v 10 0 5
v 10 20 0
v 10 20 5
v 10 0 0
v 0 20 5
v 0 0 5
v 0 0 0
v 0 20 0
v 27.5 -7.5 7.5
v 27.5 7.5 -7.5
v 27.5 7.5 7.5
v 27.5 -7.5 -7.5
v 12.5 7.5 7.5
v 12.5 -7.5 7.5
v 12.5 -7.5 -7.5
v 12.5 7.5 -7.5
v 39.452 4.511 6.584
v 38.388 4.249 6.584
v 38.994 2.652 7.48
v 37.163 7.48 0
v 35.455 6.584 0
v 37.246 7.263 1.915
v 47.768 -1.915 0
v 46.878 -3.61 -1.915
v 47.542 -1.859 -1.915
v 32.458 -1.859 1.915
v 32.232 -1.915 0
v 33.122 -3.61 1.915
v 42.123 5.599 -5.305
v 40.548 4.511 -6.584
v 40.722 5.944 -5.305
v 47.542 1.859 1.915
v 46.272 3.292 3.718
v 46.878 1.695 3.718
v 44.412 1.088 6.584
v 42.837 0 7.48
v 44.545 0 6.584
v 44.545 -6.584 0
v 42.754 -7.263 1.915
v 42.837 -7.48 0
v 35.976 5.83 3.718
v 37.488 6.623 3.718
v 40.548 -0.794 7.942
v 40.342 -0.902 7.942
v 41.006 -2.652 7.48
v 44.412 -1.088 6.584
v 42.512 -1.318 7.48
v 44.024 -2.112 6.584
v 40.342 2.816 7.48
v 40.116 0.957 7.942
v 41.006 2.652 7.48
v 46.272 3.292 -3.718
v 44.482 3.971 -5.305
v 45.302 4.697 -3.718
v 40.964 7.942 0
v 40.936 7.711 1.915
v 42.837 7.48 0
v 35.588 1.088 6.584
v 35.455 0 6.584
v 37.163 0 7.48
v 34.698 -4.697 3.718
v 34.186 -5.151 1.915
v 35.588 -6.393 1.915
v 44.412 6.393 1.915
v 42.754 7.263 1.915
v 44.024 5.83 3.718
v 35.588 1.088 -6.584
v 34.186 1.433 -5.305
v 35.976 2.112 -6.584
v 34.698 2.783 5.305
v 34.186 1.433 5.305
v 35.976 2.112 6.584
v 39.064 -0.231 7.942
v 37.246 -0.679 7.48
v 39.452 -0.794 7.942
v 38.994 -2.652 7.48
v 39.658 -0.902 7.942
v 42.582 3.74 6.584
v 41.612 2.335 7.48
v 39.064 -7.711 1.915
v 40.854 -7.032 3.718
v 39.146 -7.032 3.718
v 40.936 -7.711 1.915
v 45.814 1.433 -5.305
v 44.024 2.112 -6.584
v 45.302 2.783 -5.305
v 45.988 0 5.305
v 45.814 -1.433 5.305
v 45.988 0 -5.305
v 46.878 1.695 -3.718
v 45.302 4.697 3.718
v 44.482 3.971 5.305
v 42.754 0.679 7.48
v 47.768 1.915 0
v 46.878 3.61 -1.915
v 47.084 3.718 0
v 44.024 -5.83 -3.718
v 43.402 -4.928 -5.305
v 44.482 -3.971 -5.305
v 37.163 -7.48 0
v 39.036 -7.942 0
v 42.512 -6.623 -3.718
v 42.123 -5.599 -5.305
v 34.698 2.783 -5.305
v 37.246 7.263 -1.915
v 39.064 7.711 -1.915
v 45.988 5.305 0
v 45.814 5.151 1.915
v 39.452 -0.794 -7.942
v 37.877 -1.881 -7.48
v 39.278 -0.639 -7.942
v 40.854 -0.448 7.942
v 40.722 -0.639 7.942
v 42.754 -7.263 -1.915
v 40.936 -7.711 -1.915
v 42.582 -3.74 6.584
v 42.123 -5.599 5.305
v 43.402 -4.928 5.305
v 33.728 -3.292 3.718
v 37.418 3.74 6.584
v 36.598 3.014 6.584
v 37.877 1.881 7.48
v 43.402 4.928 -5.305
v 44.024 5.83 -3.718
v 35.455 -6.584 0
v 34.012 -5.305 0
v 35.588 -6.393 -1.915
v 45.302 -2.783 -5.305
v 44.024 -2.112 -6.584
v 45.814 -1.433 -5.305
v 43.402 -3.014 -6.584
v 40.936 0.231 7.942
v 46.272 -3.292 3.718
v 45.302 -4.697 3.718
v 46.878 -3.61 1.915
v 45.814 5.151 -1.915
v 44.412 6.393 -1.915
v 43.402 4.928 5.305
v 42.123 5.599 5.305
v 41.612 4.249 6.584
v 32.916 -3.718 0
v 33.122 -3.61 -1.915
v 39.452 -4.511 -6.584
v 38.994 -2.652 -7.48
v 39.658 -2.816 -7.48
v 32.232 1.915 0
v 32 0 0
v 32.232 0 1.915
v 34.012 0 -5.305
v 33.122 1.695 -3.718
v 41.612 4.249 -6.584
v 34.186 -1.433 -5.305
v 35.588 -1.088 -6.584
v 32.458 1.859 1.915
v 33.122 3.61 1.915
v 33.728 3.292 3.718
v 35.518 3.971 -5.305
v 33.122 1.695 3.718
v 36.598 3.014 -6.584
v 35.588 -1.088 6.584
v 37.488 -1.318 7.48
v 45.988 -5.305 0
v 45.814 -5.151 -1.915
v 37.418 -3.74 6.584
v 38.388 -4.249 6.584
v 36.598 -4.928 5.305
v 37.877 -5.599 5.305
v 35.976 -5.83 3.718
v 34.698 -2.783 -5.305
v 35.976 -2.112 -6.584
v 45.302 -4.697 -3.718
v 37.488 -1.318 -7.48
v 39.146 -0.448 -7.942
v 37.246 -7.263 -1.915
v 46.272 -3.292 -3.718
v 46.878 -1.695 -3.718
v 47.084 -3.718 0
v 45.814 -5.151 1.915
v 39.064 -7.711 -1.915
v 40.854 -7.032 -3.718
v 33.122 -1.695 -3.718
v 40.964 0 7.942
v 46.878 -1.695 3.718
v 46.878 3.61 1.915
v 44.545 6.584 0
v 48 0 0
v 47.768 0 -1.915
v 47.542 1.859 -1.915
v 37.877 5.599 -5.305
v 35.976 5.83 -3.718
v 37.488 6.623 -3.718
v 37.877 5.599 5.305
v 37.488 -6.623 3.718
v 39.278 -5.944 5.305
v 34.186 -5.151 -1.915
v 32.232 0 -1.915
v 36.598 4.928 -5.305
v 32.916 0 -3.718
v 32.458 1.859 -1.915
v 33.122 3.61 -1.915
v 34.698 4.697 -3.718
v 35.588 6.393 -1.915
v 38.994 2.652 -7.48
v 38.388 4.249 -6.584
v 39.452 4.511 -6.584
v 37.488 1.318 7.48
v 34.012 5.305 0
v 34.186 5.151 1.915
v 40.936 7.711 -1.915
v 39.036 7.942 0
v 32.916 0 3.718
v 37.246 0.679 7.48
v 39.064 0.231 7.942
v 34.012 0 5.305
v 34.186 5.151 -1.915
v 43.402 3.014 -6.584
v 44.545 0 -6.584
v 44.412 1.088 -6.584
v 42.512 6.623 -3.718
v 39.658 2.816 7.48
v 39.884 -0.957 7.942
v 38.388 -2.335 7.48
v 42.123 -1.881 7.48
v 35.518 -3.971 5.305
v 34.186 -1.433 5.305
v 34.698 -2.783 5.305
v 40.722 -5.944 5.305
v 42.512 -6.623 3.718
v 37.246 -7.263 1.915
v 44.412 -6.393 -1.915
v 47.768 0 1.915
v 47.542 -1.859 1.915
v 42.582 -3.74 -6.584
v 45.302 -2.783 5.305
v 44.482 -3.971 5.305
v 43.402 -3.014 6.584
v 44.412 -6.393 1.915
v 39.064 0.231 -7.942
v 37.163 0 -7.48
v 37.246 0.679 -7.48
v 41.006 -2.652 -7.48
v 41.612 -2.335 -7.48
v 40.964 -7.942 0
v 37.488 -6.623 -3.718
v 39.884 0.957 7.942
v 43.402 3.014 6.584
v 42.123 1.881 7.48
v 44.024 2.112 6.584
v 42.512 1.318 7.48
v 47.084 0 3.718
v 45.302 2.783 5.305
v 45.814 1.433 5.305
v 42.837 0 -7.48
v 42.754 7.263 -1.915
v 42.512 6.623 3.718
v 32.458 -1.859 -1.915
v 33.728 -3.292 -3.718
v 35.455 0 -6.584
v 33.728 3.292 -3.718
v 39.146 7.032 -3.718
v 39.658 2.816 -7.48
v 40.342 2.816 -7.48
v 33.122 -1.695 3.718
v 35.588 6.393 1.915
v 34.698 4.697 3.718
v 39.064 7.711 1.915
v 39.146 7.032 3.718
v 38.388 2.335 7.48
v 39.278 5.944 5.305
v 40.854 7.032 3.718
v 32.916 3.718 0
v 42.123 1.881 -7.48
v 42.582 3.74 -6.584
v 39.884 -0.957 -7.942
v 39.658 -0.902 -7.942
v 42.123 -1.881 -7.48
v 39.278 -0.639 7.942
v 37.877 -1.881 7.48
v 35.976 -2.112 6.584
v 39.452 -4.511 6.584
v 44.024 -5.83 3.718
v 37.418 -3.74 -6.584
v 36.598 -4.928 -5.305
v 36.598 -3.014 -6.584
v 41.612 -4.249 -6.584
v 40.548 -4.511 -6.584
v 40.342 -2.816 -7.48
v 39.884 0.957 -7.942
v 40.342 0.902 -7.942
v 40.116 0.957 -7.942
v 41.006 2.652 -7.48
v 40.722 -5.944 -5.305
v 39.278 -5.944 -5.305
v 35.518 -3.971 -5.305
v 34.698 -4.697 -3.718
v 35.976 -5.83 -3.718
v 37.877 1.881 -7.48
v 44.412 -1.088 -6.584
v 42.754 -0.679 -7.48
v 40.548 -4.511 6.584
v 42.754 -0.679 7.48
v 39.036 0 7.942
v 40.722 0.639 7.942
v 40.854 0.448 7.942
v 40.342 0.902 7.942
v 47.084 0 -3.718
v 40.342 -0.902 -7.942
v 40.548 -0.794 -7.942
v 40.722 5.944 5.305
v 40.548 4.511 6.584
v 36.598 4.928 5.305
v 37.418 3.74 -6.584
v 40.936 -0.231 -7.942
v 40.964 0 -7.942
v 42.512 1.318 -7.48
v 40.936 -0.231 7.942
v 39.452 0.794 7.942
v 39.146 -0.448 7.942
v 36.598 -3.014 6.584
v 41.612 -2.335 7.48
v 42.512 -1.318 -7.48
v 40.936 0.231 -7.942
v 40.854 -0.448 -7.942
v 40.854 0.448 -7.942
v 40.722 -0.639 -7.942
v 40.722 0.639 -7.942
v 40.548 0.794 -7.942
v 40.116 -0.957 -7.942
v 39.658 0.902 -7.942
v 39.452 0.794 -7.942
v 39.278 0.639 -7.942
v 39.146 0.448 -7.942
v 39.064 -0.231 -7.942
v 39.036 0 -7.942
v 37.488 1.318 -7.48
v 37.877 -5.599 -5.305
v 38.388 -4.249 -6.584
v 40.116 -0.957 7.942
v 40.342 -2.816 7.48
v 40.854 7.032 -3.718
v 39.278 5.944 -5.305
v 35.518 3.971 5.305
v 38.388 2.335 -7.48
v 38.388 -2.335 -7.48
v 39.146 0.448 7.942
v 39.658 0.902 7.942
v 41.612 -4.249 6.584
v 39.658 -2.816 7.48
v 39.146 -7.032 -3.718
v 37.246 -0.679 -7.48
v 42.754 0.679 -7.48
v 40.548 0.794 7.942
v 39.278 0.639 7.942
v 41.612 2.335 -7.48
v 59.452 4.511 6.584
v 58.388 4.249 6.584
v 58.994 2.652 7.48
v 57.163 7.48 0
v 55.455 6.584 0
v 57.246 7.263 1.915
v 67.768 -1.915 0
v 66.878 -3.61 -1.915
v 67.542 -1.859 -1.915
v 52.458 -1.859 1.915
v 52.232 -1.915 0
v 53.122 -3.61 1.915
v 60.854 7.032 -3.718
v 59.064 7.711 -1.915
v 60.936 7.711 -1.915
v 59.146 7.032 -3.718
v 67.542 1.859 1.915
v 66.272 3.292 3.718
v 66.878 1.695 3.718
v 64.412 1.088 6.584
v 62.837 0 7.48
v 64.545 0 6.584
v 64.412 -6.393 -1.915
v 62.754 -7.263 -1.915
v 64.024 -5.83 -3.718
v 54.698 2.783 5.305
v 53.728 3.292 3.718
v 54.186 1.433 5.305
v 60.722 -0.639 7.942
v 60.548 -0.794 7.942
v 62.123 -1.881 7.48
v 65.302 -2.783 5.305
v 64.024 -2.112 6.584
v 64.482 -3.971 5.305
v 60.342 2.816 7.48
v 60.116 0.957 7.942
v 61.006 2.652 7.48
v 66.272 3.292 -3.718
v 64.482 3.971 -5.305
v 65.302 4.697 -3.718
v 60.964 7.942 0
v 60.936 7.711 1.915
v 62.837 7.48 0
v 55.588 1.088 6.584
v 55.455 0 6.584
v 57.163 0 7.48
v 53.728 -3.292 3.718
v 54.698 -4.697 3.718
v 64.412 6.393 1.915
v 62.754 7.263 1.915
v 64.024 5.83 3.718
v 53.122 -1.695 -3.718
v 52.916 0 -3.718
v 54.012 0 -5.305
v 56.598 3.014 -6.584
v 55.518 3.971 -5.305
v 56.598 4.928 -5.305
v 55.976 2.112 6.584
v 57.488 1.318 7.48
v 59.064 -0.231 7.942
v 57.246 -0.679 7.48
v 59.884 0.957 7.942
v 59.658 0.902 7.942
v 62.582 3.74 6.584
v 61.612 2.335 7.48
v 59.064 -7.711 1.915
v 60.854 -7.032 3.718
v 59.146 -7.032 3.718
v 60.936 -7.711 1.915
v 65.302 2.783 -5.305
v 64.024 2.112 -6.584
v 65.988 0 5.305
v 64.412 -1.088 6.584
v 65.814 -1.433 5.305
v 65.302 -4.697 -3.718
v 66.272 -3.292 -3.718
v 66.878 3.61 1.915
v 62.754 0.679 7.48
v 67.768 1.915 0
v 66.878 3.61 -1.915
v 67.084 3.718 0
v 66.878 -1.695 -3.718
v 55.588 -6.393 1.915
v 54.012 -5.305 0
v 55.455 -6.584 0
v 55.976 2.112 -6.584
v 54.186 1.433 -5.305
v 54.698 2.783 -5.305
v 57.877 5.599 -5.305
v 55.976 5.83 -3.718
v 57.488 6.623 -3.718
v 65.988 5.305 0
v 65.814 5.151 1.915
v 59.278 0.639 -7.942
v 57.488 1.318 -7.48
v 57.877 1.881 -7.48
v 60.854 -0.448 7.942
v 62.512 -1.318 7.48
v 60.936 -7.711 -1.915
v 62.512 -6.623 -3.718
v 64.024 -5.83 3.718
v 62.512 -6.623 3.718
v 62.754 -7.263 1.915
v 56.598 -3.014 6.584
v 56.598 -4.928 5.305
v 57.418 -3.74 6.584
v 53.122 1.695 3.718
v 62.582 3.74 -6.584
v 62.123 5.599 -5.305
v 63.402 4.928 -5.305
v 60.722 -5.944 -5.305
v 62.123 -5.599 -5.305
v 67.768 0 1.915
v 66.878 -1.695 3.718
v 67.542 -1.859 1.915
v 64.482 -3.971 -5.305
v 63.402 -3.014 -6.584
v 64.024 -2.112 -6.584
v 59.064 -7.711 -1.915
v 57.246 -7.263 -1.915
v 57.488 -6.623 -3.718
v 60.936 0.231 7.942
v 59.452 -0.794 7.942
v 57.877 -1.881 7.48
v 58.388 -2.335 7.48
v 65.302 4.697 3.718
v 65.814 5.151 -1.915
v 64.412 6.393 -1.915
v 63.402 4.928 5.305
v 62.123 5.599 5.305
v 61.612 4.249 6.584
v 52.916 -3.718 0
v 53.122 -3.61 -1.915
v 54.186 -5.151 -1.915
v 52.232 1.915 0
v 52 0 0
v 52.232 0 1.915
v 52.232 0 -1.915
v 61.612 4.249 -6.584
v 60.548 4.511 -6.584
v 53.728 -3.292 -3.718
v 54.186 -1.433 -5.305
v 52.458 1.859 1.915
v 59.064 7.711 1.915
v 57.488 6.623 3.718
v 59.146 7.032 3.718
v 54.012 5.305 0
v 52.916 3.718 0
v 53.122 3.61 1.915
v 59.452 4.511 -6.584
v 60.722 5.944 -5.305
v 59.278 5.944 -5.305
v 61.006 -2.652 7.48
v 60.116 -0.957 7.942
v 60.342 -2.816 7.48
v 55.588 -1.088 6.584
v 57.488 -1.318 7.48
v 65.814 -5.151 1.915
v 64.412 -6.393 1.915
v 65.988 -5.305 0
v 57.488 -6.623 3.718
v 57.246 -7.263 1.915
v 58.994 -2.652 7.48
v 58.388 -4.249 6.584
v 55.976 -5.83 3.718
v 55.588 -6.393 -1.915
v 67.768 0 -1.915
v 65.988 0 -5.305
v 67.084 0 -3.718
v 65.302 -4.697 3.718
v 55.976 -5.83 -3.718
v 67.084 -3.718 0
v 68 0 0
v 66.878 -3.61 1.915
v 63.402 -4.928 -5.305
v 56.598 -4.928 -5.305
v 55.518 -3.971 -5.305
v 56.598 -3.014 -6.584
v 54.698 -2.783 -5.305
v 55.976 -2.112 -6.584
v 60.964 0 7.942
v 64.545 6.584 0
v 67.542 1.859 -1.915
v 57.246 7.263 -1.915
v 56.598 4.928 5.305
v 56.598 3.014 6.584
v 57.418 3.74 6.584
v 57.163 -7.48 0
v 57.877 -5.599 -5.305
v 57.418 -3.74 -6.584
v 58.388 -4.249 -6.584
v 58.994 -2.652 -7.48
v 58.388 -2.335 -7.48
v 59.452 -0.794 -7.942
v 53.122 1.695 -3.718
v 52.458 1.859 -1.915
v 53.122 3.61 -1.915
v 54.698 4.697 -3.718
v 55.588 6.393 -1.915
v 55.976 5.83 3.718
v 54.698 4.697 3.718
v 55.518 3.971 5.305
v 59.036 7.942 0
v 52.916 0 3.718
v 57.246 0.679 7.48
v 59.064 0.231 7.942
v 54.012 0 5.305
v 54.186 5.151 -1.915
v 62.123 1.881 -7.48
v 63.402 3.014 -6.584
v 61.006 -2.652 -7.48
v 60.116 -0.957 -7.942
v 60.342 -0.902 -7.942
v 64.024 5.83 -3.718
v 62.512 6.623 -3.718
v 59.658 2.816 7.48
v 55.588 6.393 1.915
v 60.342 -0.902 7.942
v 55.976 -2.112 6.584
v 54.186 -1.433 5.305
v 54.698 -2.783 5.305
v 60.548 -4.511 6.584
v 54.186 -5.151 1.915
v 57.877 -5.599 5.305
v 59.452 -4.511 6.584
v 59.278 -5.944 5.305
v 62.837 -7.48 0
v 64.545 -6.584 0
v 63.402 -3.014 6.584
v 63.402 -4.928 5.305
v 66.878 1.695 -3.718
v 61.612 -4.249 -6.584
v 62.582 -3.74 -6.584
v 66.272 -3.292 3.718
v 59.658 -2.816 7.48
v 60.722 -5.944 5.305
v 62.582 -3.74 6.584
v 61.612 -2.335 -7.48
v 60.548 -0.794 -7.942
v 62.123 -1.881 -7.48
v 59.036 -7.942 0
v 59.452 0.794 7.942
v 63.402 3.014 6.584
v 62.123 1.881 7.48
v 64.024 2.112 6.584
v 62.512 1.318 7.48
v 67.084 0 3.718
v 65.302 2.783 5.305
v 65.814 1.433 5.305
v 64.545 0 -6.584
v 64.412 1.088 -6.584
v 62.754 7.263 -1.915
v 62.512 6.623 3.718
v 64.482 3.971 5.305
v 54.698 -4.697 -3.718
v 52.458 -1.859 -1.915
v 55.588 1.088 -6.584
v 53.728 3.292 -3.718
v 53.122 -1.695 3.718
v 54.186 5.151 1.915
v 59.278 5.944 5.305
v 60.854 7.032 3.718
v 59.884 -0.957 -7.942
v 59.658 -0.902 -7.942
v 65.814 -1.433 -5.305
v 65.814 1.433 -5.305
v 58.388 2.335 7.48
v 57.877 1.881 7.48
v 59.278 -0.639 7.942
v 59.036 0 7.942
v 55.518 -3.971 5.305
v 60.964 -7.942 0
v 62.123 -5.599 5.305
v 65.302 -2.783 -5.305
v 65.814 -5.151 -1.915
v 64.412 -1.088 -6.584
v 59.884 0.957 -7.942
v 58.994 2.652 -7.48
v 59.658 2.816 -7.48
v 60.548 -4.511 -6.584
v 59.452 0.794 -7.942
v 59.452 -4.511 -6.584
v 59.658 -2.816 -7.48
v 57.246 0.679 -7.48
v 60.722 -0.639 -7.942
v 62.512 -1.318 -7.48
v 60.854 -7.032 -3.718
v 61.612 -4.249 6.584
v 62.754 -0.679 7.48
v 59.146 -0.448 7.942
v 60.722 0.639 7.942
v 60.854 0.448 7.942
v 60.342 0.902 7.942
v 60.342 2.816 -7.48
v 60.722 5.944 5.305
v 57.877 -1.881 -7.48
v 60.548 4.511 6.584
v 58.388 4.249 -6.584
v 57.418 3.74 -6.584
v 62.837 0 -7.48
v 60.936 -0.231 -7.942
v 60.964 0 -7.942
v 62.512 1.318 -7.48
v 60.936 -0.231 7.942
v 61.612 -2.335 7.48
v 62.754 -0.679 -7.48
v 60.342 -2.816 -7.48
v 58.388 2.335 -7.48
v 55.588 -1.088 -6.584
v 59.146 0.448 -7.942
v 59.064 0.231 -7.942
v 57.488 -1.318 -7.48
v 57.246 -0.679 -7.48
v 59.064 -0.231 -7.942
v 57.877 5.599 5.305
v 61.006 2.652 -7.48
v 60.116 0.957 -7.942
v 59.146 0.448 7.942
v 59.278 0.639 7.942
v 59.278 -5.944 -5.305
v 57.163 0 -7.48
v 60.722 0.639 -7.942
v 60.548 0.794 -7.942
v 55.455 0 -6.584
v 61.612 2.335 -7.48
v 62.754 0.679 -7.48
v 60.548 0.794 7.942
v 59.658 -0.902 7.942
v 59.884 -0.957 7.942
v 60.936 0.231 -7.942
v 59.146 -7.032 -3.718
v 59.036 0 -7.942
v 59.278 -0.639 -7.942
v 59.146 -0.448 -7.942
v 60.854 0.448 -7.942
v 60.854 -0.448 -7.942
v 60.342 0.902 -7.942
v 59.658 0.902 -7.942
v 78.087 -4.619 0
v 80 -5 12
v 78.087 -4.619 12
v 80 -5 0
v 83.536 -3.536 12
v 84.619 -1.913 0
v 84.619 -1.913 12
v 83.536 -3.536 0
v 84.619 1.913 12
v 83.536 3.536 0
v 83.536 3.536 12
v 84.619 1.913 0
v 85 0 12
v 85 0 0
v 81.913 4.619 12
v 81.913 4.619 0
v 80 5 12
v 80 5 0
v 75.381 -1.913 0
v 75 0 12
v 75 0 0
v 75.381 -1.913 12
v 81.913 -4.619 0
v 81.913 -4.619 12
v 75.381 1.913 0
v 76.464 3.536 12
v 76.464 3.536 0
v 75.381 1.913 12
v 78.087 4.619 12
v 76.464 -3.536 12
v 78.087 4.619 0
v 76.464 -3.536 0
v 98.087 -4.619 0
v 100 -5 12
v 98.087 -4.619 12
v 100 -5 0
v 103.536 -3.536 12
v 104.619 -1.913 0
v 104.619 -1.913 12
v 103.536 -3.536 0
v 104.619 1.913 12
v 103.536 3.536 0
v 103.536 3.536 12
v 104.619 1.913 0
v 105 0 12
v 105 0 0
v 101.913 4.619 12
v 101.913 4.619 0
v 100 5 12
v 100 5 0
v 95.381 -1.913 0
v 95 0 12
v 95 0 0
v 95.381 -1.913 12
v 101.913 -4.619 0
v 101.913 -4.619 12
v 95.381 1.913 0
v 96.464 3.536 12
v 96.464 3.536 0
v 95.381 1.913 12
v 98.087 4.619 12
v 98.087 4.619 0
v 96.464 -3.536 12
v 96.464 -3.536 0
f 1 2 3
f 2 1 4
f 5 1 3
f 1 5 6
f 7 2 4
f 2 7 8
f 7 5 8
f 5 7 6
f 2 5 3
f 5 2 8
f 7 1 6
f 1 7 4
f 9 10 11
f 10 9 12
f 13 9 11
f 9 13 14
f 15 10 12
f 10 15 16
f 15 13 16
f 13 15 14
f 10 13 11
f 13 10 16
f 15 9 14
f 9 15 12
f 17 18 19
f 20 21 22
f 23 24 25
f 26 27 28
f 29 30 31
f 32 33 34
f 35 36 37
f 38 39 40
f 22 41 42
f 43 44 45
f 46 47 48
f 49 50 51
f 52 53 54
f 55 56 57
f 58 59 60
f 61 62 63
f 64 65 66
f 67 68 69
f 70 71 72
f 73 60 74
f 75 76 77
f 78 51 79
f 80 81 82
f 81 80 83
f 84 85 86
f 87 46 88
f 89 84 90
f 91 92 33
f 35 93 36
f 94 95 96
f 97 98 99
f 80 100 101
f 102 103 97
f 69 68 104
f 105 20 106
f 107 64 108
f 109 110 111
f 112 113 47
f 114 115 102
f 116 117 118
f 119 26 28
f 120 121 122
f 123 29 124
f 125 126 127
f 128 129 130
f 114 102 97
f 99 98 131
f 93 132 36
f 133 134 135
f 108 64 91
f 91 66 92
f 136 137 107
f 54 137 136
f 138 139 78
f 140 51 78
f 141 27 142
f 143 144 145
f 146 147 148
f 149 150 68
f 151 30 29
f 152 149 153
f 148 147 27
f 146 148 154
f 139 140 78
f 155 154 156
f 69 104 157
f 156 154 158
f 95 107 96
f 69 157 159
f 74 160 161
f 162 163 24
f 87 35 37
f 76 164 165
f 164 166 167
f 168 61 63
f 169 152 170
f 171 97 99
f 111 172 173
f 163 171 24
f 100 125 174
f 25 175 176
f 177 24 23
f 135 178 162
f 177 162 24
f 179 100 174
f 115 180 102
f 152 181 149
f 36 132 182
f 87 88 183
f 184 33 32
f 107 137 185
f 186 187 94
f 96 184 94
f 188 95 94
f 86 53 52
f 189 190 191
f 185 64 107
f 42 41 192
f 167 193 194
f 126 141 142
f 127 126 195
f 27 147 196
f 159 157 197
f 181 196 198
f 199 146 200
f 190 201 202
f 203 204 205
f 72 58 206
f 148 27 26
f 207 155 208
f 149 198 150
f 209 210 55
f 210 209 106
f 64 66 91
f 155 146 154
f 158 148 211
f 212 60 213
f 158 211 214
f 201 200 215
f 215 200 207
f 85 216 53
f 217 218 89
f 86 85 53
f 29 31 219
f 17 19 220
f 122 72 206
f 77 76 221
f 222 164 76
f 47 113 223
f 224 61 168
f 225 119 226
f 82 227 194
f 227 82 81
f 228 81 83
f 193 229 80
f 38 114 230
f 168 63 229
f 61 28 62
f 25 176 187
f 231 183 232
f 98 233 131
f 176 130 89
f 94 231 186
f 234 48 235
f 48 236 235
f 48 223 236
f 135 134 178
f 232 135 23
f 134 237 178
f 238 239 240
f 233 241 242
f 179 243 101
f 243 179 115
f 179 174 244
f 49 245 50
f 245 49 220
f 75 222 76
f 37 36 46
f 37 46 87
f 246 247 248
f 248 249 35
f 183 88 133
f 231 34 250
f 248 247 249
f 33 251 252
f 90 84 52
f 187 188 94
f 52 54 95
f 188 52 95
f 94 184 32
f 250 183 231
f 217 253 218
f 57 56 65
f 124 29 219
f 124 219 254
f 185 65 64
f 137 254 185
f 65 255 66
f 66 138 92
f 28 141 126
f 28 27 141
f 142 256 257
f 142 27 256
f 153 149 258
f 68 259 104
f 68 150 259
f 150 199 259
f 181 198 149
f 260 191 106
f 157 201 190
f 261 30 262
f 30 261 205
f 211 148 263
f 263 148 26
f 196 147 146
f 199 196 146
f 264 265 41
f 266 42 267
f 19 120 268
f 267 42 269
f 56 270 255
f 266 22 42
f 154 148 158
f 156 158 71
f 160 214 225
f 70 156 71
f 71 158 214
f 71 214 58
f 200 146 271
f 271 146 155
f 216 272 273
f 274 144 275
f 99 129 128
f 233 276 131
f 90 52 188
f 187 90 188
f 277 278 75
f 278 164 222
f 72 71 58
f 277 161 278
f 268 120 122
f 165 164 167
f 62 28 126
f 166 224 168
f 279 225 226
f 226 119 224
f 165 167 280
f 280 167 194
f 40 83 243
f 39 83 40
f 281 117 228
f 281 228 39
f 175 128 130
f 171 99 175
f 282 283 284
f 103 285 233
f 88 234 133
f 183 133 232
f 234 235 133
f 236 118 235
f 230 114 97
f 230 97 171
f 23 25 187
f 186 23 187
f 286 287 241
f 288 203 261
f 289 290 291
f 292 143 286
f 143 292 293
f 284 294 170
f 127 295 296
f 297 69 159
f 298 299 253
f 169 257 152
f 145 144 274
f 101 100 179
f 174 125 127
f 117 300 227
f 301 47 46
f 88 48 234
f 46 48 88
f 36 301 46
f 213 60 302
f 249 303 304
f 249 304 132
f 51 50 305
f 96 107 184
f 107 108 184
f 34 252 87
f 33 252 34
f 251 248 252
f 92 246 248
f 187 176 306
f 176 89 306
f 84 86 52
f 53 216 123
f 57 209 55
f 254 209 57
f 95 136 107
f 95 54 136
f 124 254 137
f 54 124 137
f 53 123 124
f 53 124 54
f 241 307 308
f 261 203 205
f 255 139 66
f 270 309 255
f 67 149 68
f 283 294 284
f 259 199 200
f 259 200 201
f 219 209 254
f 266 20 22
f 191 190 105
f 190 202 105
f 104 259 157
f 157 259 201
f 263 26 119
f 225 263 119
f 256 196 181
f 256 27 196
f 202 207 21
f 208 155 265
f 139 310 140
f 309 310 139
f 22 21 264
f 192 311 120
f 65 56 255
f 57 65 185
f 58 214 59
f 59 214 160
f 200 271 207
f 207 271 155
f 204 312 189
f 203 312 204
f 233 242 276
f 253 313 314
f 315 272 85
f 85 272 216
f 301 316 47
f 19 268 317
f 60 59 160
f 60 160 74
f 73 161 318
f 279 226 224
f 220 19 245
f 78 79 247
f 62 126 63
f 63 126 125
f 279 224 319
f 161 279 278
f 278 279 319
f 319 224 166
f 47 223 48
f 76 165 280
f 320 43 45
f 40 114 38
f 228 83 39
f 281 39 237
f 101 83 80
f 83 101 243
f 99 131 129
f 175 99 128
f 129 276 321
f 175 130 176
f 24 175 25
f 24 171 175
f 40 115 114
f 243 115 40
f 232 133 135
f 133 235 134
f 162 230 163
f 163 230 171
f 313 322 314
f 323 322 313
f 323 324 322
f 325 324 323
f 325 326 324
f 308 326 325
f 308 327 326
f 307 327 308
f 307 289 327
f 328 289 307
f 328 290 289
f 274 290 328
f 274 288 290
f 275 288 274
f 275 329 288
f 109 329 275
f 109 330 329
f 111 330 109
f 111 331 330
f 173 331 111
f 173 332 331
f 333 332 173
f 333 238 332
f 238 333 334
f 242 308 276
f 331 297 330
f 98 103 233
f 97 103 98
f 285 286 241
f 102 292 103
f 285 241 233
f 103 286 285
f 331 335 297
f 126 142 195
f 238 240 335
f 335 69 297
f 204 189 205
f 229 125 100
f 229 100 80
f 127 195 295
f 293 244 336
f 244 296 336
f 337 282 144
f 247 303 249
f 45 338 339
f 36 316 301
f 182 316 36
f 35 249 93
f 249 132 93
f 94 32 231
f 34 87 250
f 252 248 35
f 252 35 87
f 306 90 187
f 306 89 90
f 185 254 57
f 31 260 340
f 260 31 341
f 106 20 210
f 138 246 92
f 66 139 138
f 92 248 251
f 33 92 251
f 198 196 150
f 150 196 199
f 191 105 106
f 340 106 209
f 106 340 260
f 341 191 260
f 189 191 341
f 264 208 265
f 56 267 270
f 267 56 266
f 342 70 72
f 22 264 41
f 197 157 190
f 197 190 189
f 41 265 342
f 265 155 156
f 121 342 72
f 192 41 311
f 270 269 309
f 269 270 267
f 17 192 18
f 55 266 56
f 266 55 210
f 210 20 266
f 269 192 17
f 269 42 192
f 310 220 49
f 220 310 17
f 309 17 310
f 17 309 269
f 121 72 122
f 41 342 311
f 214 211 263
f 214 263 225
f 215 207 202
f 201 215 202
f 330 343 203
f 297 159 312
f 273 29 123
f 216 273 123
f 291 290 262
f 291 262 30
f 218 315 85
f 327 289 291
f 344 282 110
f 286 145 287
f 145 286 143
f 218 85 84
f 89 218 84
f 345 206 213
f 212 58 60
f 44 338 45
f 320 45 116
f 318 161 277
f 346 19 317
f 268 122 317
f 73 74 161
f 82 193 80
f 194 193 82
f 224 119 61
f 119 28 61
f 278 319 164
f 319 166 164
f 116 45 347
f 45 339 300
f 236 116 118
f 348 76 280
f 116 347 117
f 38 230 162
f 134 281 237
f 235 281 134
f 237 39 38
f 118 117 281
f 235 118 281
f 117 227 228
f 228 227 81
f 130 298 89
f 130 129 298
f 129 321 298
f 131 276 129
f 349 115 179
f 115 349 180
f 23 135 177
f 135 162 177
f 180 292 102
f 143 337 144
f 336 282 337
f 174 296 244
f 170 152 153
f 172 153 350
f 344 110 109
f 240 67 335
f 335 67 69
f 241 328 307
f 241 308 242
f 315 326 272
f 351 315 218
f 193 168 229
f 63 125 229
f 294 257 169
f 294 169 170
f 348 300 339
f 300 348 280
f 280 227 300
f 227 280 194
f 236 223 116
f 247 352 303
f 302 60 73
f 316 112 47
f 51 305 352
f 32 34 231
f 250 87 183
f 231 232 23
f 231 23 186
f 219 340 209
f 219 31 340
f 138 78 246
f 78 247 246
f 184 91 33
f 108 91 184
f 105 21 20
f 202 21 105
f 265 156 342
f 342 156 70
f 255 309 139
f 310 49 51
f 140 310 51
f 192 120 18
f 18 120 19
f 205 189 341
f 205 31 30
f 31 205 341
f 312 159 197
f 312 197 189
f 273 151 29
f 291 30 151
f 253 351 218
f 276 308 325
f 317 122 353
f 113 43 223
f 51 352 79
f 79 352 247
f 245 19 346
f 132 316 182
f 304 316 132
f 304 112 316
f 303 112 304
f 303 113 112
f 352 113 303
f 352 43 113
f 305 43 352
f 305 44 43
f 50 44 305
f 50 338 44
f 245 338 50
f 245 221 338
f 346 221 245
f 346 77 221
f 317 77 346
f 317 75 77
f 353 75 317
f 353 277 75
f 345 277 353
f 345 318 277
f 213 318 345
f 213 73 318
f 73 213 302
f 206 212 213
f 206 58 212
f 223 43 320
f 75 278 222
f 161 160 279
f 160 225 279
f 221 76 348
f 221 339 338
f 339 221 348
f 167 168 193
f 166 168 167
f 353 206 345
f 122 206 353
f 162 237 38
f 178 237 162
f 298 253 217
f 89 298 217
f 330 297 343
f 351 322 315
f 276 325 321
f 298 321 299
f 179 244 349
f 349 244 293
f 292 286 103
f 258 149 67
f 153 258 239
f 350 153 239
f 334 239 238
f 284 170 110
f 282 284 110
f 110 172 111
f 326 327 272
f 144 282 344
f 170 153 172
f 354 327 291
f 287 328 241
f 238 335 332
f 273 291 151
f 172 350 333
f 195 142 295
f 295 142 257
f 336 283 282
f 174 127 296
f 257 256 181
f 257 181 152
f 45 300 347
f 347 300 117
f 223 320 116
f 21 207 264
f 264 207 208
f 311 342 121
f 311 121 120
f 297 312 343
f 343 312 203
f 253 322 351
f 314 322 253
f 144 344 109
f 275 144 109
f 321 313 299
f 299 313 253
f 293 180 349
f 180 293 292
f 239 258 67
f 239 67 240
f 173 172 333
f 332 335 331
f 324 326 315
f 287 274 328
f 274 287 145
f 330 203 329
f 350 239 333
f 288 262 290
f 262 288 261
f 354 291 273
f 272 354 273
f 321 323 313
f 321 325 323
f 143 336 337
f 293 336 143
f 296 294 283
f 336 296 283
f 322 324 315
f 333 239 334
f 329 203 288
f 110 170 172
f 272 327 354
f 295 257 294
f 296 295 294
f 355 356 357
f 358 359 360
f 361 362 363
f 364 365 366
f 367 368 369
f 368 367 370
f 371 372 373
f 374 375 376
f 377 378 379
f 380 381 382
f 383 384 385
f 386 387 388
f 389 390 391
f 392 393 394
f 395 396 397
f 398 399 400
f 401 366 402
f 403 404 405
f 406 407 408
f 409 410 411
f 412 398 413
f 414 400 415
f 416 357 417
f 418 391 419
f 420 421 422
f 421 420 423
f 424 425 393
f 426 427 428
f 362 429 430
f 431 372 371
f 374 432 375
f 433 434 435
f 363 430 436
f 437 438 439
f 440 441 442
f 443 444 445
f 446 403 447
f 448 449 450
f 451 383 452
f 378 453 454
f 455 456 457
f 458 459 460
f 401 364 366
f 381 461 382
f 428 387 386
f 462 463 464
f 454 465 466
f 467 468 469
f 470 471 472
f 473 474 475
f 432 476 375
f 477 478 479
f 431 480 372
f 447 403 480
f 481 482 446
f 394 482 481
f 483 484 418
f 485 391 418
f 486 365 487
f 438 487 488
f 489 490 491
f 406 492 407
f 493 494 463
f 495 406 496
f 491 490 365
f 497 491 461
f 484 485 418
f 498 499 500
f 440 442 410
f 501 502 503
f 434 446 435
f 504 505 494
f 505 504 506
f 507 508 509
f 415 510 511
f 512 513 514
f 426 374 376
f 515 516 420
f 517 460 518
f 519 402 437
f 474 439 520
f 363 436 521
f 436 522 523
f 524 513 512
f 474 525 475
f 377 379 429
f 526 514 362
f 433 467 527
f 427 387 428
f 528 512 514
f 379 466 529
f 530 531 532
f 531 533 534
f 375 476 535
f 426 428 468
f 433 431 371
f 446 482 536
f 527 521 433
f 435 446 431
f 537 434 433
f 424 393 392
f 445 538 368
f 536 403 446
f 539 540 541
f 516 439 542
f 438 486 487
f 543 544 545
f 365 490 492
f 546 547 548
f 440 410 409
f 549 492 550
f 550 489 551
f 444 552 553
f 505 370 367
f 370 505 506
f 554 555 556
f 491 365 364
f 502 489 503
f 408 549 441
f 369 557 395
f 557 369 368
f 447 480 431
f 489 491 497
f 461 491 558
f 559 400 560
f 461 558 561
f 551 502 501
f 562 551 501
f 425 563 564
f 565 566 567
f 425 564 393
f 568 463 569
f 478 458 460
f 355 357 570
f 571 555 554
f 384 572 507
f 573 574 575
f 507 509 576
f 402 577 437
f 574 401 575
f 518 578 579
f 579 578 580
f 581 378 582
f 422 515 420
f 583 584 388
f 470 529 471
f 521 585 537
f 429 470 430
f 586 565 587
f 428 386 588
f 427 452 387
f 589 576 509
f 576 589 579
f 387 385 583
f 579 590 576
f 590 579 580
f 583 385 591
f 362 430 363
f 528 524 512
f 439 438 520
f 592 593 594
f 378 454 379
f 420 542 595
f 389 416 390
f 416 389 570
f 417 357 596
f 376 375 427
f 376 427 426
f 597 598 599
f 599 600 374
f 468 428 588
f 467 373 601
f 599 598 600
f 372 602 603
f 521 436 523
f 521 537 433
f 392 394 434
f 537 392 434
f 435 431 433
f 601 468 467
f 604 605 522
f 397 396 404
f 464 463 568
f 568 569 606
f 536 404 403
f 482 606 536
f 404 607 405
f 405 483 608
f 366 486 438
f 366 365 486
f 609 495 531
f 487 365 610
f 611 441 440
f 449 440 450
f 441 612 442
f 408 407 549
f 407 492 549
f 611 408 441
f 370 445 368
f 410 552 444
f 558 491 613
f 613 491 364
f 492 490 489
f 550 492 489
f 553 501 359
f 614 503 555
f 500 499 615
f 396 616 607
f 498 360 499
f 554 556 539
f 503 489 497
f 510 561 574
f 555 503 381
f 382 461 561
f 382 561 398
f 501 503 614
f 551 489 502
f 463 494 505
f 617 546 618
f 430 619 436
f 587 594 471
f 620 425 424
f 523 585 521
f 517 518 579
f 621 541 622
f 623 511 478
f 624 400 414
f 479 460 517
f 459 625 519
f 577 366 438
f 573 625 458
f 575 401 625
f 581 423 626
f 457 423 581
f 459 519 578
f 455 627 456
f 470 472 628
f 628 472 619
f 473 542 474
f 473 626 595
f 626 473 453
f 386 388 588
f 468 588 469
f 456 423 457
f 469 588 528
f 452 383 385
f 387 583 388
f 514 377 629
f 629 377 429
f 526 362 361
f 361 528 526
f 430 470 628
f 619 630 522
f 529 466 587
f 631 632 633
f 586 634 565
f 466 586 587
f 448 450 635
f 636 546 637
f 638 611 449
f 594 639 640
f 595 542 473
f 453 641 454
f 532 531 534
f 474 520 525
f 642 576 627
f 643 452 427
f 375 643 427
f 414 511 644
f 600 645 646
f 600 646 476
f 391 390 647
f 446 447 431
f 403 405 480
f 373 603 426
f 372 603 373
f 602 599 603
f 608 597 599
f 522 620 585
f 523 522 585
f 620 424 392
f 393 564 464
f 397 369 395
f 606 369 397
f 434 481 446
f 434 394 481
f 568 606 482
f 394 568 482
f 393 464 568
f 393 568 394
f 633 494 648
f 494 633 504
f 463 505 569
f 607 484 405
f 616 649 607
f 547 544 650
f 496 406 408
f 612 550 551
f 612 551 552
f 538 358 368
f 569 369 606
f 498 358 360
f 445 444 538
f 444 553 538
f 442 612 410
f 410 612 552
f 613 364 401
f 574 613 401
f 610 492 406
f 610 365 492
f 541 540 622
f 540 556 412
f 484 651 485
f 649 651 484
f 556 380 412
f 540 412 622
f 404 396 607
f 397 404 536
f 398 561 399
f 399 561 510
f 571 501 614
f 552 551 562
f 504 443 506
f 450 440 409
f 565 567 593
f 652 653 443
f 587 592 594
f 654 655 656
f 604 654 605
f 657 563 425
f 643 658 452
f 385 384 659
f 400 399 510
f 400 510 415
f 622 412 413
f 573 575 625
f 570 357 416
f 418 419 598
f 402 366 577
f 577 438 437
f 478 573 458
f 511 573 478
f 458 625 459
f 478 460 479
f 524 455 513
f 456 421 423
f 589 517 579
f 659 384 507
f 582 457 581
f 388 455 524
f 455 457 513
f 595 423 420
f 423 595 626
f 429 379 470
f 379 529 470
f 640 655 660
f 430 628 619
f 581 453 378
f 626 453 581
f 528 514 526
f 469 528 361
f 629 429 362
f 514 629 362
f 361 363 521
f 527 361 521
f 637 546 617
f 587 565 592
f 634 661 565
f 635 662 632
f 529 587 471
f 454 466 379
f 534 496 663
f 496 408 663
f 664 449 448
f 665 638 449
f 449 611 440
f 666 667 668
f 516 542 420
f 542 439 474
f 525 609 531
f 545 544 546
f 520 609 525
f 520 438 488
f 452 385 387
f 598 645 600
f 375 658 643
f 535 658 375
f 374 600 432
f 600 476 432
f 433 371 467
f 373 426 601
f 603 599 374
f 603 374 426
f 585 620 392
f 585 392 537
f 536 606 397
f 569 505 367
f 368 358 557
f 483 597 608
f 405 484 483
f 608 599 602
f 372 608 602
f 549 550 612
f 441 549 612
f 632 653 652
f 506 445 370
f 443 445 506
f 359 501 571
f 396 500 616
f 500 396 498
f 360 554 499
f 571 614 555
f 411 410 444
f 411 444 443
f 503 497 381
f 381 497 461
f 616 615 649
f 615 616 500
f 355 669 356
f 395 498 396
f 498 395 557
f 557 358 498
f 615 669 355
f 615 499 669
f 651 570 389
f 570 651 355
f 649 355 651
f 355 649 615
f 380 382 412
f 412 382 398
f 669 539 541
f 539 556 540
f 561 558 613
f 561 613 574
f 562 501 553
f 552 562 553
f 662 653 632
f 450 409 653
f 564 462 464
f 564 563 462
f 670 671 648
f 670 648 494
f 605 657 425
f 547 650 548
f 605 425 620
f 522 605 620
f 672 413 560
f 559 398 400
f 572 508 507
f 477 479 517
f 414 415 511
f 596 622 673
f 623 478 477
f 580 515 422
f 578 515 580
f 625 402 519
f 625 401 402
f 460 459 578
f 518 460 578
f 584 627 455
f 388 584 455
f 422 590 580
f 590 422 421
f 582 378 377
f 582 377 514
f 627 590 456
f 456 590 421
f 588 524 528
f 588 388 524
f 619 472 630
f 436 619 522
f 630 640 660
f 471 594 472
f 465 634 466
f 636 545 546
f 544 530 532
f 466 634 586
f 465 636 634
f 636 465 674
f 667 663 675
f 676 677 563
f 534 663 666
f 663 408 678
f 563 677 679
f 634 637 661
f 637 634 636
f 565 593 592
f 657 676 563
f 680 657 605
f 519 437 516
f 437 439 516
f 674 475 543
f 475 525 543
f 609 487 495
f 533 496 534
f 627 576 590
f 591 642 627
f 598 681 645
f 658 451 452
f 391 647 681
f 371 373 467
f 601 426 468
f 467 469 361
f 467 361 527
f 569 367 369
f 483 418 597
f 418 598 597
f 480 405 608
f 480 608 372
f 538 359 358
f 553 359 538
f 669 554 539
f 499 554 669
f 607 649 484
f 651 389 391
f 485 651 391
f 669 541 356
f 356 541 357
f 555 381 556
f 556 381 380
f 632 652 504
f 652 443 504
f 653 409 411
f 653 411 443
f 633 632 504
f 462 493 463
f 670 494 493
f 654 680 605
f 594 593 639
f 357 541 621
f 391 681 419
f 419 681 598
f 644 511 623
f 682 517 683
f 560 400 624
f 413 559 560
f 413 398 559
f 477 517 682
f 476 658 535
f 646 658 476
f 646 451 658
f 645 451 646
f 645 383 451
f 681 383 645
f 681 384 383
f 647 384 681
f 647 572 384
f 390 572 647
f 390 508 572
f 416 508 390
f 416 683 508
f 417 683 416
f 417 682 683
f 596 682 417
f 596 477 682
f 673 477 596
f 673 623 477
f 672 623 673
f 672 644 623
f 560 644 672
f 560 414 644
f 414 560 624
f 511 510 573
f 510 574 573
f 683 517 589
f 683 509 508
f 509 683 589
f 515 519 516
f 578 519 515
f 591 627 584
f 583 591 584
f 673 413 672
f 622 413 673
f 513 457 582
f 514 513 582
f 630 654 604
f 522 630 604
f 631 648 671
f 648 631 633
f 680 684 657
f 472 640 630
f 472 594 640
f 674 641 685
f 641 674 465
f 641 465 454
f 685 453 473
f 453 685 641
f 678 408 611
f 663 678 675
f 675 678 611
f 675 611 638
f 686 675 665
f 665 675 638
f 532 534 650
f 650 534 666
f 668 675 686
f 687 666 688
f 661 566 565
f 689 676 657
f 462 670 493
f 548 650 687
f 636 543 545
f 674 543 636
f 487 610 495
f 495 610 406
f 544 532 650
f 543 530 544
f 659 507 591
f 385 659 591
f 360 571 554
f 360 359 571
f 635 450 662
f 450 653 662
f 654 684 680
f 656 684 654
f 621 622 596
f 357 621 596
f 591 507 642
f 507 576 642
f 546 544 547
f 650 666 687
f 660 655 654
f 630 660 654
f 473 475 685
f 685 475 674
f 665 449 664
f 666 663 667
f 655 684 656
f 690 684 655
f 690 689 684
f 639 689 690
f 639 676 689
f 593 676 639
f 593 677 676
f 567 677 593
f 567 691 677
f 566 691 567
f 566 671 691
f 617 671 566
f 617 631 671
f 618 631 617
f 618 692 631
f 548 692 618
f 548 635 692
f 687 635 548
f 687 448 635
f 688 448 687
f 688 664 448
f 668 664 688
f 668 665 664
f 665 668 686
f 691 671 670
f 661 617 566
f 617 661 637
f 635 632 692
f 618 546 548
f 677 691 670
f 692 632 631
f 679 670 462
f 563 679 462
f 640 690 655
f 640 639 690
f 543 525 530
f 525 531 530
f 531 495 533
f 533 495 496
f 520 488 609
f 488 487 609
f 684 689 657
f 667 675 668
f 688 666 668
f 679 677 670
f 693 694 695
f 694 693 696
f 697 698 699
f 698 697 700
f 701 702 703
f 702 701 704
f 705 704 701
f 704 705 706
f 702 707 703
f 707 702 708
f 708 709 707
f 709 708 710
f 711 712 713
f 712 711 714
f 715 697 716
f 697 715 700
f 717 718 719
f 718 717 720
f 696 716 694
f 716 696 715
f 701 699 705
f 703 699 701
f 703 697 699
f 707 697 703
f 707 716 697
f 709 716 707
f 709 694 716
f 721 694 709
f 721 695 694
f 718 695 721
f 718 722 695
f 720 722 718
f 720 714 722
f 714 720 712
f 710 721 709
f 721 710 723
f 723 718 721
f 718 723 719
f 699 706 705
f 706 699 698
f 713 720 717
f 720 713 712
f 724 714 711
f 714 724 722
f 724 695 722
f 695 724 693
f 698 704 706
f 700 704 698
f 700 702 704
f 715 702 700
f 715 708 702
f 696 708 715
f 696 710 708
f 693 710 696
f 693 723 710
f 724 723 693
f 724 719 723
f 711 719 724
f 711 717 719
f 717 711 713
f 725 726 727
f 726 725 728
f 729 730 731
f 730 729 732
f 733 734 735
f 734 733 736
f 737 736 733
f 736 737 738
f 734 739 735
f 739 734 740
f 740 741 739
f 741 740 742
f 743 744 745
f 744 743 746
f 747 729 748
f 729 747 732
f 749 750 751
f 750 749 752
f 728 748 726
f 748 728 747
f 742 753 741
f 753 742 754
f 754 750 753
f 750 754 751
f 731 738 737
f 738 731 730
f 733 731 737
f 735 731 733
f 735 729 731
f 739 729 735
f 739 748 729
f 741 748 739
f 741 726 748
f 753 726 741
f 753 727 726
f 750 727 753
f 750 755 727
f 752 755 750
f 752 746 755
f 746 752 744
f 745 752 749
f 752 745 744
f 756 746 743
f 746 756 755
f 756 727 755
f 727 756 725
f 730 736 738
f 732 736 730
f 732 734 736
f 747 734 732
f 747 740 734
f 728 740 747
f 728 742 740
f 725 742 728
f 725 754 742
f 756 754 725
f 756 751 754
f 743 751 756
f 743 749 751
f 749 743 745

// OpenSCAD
// TEST 01: Basic shapes — cube, sphere, cylinder, cone
// Expected tree: union of 6 shapes, all visible in viewport.
// Check: each shape has correct size label in the card.

union() {
    // cube: size vector, not centered
    translate([0, 0, 0]) {
        cube([10, 20, 5]);
    }

    // cube: scalar size, centered
    translate([20, 0, 0]) {
        cube(15, center=true);
    }

    // sphere: radius notation
    translate([40, 0, 0]) {
        sphere(r=8);
    }

    // sphere: diameter notation — card should show D=16
    translate([60, 0, 0]) {
        sphere(d=16);
    }

    // cylinder: r notation
    translate([80, 0, 0]) {
        cylinder(h=12, r=5);
    }

    // cylinder: d notation — card should show D=10
    translate([100, 0, 0]) {
        cylinder(h=12, d=10);
    }
}
